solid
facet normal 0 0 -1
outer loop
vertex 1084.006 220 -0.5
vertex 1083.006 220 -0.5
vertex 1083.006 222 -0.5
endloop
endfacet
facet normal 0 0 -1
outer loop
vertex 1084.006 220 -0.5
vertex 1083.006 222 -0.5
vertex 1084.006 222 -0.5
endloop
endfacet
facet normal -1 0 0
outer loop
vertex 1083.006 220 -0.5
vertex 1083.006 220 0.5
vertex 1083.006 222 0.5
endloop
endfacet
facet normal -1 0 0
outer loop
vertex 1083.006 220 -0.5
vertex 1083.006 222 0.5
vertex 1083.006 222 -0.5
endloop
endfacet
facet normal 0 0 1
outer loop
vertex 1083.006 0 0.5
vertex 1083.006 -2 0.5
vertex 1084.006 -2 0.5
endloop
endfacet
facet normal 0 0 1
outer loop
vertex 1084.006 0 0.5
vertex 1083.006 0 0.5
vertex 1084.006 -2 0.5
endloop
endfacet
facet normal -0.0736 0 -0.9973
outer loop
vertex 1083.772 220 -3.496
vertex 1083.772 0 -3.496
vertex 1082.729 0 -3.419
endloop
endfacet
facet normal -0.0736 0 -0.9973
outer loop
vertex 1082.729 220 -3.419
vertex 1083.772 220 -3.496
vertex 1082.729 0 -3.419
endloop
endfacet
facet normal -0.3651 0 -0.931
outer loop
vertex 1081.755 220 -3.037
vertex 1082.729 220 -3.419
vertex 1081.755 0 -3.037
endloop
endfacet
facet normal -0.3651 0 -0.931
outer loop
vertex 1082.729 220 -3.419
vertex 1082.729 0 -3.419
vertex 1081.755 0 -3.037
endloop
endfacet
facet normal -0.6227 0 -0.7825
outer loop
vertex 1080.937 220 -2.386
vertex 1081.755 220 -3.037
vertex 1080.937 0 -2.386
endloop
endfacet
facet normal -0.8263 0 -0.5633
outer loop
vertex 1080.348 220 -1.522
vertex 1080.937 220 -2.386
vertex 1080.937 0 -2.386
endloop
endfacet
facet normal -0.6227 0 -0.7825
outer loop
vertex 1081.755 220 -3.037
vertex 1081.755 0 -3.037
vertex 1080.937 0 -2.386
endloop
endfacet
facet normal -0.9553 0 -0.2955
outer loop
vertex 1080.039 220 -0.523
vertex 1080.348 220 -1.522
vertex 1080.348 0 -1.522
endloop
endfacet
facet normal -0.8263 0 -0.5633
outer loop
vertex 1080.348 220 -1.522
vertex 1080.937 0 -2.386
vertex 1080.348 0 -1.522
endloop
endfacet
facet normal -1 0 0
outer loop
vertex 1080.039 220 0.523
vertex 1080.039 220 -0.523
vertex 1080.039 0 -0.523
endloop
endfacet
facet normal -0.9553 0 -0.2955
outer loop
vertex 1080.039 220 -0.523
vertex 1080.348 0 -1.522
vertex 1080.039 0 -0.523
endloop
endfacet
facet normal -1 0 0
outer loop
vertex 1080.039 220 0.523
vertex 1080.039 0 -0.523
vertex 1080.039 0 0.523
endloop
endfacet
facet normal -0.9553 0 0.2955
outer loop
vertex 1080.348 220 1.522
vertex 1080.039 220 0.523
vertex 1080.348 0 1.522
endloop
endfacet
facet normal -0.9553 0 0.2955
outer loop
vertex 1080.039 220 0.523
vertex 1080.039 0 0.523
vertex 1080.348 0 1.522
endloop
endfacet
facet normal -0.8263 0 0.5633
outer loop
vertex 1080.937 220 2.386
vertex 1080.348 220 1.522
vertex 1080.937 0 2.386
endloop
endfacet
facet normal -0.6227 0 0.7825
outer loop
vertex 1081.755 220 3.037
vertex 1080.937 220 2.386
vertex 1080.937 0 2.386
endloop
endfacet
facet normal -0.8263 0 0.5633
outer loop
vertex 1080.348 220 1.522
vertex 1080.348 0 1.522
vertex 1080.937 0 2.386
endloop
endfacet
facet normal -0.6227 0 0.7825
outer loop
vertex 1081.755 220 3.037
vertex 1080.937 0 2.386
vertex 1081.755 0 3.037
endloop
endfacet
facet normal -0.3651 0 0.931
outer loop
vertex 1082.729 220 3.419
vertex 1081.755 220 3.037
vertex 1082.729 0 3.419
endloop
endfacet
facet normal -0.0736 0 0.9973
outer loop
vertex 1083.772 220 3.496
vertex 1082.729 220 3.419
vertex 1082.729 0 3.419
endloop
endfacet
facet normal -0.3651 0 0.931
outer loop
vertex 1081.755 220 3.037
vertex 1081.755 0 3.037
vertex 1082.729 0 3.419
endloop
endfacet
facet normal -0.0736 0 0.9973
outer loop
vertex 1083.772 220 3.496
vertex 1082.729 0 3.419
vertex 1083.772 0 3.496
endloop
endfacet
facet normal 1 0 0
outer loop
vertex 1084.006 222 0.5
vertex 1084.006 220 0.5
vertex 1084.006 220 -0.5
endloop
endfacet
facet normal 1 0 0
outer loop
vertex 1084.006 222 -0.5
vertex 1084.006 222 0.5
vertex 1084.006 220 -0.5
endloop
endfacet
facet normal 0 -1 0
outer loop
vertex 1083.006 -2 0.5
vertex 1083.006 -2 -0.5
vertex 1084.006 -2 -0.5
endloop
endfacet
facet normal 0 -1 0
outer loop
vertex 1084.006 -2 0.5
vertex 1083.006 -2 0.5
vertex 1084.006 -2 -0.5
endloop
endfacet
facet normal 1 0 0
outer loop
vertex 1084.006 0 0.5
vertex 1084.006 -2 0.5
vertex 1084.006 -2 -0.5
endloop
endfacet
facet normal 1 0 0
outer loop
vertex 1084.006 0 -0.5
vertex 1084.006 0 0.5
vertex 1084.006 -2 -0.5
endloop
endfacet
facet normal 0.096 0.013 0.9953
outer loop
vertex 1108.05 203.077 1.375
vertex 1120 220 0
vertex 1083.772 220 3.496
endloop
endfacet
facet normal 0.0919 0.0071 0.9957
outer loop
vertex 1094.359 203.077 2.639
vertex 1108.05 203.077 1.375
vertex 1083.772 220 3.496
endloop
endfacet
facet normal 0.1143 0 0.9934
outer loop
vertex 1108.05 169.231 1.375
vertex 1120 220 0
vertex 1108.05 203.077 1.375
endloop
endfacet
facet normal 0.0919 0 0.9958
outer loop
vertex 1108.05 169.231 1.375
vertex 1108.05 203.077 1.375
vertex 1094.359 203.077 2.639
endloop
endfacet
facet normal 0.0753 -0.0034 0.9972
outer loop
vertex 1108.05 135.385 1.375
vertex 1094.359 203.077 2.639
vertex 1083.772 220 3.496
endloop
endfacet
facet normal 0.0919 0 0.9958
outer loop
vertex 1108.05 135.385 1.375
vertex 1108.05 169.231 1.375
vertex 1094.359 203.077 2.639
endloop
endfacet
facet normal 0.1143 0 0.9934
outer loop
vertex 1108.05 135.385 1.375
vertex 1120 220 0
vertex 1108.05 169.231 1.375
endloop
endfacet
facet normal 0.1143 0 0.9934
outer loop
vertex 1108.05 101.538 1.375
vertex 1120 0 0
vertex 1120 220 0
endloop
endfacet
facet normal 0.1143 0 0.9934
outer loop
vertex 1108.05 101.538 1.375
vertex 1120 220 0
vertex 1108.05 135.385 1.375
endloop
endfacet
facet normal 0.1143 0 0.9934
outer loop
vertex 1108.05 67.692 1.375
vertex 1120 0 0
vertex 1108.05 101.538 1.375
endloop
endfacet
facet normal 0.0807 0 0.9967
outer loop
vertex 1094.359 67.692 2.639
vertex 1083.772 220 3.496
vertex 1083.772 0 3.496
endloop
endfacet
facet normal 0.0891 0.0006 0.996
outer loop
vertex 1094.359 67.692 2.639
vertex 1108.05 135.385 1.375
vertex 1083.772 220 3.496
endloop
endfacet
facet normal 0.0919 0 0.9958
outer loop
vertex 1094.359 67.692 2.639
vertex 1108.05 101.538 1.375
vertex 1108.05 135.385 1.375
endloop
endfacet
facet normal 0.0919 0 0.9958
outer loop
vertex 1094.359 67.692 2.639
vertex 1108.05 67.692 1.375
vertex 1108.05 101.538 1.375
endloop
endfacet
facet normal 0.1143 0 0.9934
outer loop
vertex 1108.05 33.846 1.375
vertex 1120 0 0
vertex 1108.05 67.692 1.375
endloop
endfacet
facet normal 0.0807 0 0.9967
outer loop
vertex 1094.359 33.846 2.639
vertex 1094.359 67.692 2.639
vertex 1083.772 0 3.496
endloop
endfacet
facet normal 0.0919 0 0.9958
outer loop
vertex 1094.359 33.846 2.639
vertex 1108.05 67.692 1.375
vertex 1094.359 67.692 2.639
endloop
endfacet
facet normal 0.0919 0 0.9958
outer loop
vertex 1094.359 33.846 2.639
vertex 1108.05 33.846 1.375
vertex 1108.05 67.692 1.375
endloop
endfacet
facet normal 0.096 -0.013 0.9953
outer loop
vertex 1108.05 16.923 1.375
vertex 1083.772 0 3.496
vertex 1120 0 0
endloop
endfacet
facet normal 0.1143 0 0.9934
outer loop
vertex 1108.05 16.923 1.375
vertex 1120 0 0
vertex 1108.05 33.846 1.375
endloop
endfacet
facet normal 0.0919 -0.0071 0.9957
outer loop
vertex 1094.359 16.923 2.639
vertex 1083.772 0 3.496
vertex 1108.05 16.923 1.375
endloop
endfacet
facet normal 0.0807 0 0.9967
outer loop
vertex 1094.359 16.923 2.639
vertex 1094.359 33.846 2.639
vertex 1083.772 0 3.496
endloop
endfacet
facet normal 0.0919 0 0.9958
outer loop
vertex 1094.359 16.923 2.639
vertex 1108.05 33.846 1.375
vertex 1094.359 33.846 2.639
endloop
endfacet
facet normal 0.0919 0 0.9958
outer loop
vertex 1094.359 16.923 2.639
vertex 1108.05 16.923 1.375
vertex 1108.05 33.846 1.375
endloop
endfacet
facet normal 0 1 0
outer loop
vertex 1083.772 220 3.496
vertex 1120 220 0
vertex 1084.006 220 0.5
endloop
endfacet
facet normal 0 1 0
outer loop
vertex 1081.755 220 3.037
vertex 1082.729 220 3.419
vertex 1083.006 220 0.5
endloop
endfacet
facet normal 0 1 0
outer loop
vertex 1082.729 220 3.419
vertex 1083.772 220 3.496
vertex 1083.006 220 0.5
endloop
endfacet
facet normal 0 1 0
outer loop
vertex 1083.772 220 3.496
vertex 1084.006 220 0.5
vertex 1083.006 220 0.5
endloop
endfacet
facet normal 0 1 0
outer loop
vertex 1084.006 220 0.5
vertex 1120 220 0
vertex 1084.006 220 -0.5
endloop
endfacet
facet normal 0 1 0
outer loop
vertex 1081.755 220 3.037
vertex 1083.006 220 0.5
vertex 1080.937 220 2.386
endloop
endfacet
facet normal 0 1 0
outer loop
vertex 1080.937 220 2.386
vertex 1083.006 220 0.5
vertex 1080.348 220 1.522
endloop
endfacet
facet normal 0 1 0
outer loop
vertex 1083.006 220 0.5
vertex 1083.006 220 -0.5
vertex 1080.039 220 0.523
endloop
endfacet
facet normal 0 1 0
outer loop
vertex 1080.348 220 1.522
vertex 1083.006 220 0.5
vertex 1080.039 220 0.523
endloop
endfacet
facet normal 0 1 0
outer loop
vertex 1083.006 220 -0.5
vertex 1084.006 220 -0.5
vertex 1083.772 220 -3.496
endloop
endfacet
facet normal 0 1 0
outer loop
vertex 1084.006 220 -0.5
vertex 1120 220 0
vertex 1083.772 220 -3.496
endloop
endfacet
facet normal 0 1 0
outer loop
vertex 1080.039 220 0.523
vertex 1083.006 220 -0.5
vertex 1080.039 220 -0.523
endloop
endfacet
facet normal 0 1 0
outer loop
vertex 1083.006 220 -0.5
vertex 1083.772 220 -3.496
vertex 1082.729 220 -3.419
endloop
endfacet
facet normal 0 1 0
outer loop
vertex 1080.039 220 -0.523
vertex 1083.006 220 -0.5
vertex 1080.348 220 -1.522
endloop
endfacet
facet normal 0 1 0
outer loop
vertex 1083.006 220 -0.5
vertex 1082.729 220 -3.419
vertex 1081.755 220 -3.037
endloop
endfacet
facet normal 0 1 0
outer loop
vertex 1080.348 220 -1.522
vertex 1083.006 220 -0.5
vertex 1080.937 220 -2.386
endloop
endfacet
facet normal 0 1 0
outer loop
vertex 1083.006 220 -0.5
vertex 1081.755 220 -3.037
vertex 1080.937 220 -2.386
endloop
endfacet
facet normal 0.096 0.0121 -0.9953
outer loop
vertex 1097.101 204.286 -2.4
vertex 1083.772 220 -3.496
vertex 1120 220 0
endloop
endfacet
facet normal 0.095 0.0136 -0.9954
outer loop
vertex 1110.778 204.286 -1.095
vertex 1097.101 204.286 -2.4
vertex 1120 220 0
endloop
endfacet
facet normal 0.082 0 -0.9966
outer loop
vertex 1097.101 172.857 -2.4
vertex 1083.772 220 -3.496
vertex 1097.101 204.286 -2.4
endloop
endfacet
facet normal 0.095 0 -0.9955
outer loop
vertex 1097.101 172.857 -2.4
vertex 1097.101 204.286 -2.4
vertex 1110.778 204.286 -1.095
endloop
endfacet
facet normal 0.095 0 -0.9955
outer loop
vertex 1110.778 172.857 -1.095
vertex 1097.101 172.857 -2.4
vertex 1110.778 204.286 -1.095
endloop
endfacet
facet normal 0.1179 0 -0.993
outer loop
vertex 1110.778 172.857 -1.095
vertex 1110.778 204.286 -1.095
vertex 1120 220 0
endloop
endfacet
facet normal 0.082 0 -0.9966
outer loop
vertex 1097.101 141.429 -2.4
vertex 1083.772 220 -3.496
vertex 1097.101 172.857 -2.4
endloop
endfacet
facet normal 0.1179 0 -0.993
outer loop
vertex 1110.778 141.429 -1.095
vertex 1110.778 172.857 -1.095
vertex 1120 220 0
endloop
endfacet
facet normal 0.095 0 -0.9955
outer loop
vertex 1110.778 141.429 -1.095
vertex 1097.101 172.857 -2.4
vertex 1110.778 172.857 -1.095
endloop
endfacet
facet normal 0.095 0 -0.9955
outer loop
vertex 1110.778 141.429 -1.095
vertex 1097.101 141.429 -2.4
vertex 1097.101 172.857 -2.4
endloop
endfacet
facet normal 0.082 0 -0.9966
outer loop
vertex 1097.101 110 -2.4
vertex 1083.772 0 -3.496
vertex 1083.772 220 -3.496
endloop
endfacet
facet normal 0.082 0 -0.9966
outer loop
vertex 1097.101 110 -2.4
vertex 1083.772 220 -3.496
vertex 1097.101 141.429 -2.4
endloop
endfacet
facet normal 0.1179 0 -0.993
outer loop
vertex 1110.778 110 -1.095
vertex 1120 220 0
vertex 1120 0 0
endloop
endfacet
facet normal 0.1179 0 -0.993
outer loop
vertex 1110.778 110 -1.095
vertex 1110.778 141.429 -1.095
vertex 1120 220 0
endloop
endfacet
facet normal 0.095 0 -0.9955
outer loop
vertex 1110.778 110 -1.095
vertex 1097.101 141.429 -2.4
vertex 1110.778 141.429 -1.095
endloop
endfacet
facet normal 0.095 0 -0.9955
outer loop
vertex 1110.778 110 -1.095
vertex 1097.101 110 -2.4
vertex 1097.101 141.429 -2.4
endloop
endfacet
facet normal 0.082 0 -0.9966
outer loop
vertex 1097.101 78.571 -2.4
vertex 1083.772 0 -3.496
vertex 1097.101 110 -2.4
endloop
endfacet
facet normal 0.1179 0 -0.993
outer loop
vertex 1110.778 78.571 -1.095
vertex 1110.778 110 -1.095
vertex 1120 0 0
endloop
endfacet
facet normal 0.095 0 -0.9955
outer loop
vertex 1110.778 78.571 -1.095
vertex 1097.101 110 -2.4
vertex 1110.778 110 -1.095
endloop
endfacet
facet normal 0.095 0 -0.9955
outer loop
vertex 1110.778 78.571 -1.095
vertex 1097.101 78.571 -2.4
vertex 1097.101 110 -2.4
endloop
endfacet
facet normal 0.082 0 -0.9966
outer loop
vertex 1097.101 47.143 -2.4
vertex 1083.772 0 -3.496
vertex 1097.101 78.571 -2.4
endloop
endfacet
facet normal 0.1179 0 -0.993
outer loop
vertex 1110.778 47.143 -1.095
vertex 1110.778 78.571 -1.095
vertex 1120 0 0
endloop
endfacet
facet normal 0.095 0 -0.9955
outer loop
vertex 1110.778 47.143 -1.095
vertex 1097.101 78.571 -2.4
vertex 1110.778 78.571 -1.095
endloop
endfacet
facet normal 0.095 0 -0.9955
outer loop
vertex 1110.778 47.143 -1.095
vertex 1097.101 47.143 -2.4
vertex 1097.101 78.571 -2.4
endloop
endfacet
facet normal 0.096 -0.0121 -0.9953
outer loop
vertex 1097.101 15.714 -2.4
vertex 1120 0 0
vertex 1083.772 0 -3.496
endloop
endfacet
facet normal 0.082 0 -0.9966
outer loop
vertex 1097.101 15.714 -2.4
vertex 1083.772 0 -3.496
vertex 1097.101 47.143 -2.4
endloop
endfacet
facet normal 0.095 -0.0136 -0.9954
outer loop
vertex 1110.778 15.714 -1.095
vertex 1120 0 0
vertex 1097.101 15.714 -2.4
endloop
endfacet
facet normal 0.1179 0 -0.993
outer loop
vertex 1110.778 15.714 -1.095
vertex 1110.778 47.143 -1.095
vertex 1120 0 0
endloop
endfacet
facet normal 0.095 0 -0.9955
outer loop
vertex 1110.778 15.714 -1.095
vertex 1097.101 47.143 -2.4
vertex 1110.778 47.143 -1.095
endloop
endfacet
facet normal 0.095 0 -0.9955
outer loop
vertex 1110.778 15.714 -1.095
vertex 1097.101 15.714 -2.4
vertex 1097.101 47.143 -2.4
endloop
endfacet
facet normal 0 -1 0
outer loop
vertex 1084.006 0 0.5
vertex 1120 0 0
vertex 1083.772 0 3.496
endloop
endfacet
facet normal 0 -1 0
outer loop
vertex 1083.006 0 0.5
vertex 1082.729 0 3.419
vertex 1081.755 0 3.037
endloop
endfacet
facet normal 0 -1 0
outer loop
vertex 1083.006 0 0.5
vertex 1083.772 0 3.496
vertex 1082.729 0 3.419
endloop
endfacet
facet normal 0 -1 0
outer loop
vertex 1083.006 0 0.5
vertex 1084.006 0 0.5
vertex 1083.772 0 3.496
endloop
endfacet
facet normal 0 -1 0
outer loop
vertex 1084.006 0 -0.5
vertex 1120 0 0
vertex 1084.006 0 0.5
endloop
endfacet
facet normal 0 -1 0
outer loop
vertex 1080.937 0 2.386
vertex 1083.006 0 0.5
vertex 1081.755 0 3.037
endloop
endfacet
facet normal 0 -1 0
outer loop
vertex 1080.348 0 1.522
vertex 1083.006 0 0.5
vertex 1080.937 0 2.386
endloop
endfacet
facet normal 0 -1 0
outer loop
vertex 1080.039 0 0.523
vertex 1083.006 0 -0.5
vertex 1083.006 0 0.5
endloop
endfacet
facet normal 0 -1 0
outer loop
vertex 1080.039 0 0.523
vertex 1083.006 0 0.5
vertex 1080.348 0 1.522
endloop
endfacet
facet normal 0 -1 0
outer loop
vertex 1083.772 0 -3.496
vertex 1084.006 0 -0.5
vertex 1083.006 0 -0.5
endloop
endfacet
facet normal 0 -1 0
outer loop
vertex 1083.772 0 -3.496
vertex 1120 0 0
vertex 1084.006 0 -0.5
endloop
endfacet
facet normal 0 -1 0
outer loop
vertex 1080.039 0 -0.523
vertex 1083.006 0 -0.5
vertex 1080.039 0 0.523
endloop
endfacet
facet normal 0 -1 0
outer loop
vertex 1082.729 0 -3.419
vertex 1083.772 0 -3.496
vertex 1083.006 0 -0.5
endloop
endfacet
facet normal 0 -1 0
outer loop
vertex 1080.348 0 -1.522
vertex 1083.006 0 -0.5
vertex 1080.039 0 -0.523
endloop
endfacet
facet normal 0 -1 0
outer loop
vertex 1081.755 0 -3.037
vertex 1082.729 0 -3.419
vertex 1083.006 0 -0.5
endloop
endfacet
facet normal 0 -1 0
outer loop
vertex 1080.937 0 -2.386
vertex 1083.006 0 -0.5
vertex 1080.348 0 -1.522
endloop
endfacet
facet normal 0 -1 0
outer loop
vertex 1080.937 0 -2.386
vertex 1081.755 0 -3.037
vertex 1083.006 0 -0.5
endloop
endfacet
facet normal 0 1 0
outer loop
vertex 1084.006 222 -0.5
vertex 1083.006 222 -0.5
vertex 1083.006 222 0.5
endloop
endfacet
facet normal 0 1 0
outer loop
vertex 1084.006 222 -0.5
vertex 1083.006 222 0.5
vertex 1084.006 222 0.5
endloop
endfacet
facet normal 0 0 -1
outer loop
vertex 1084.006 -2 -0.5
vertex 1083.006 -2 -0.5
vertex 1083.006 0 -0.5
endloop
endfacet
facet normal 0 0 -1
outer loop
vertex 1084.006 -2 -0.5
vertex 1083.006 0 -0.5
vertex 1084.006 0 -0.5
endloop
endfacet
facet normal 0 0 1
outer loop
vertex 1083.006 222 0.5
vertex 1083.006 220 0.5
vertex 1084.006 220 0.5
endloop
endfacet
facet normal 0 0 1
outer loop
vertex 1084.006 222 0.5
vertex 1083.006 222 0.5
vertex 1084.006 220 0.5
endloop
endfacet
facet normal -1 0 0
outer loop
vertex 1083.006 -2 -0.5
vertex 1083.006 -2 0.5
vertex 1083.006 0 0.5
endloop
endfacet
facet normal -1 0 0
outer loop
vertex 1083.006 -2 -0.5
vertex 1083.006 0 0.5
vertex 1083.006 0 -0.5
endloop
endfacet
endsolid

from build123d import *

# Parameters (mm, degrees)
SKETCH_2_W      = 1
SKETCH_2_H      = 1
EXTRUDE_1_DEPTH = 220
EXTRUDE_START   = -2
SKETCH_2_3_W    = 1
SKETCH_2_3_H    = 1
EXTRUDE_2_DEPTH = 224


with BuildPart() as part:
    # Эскиз2 → Бобышка-Вытянуть1 (new body)
    with BuildSketch(Plane(origin=(0, 0, 0), x_dir=(1, 0, 0), z_dir=(0, 1, 0))):
        with BuildLine():
            add(Edge.make_bspline(
                [(1083.771747789, 3.495536657), (1084.559015588, 3.435605975), (1086.260562943, 3.304284604), (1088.875963221, 3.096374786), (1091.617998939, 2.871404666), (1094.359683654, 2.639618173), (1097.101060652, 2.401201187), (1099.841752147, 2.156315779), (1102.580813649, 1.904550906), (1105.317070012, 1.645478536), (1108.049481509, 1.37722039), (1110.776487444, 1.097638633), (1113.487947613, 0.807843629), (1116.127835032, 0.505124451), (1118.294910337, 0.236043523), (1119.565652922, 0.060128694), (1120, 0)],
                knots=[0.700555661, 0.700555661, 0.700555661, 0.700555661, 0.720040806, 0.742672895, 0.76530453, 0.787938655, 0.810576078, 0.833214133, 0.855845421, 0.878458096, 0.901043958, 0.923602452, 0.946110354, 0.968340532, 0.989178613, 1, 1, 1, 1], degree=3))
            ThreePointArc((1083.771747789, 3.495536657), (1080, 1.743e-06), (1083.77174419, -3.495537054))
            add(Edge.make_bspline(
                [(1120, 0), (1119.565652922, -0.060128694), (1118.294910337, -0.236043523), (1116.127835032, -0.505124451), (1113.487947613, -0.807843629), (1110.776487444, -1.097638633), (1108.049481509, -1.37722039), (1105.317070012, -1.645478536), (1102.580813649, -1.904550906), (1099.841752147, -2.156315779), (1097.101060652, -2.401201187), (1094.359683654, -2.639618173), (1091.617998939, -2.871404666), (1088.089059882, -3.160936213), (1085.473428777, -3.365998247), (1083.77174419, -3.495537054)],
                knots=[0, 0, 0, 0, 0.010821387, 0.031659468, 0.053889646, 0.076397548, 0.098956042, 0.121541904, 0.144154579, 0.166785867, 0.189423922, 0.212061345, 0.23469547, 0.257327105, 0.299444369, 0.299444369, 0.299444369, 0.299444369], degree=3))
        make_face()
        with Locations((1083.505650406, -6.1e-08)):
            Rectangle(SKETCH_2_W, SKETCH_2_H, mode=Mode.SUBTRACT)
    extrude(amount=EXTRUDE_1_DEPTH)

    # Эскиз2<3> → Бобышка-Вытянуть2 (add)
    with BuildSketch(Plane(origin=(0, 0, 0), x_dir=(1, 0, 0), z_dir=(0, 1, 0)).offset(EXTRUDE_START)):
        with Locations((1083.505650406, -6.1e-08)):
            Rectangle(SKETCH_2_3_W, SKETCH_2_3_H)
    extrude(amount=EXTRUDE_2_DEPTH)


solid = part.part
